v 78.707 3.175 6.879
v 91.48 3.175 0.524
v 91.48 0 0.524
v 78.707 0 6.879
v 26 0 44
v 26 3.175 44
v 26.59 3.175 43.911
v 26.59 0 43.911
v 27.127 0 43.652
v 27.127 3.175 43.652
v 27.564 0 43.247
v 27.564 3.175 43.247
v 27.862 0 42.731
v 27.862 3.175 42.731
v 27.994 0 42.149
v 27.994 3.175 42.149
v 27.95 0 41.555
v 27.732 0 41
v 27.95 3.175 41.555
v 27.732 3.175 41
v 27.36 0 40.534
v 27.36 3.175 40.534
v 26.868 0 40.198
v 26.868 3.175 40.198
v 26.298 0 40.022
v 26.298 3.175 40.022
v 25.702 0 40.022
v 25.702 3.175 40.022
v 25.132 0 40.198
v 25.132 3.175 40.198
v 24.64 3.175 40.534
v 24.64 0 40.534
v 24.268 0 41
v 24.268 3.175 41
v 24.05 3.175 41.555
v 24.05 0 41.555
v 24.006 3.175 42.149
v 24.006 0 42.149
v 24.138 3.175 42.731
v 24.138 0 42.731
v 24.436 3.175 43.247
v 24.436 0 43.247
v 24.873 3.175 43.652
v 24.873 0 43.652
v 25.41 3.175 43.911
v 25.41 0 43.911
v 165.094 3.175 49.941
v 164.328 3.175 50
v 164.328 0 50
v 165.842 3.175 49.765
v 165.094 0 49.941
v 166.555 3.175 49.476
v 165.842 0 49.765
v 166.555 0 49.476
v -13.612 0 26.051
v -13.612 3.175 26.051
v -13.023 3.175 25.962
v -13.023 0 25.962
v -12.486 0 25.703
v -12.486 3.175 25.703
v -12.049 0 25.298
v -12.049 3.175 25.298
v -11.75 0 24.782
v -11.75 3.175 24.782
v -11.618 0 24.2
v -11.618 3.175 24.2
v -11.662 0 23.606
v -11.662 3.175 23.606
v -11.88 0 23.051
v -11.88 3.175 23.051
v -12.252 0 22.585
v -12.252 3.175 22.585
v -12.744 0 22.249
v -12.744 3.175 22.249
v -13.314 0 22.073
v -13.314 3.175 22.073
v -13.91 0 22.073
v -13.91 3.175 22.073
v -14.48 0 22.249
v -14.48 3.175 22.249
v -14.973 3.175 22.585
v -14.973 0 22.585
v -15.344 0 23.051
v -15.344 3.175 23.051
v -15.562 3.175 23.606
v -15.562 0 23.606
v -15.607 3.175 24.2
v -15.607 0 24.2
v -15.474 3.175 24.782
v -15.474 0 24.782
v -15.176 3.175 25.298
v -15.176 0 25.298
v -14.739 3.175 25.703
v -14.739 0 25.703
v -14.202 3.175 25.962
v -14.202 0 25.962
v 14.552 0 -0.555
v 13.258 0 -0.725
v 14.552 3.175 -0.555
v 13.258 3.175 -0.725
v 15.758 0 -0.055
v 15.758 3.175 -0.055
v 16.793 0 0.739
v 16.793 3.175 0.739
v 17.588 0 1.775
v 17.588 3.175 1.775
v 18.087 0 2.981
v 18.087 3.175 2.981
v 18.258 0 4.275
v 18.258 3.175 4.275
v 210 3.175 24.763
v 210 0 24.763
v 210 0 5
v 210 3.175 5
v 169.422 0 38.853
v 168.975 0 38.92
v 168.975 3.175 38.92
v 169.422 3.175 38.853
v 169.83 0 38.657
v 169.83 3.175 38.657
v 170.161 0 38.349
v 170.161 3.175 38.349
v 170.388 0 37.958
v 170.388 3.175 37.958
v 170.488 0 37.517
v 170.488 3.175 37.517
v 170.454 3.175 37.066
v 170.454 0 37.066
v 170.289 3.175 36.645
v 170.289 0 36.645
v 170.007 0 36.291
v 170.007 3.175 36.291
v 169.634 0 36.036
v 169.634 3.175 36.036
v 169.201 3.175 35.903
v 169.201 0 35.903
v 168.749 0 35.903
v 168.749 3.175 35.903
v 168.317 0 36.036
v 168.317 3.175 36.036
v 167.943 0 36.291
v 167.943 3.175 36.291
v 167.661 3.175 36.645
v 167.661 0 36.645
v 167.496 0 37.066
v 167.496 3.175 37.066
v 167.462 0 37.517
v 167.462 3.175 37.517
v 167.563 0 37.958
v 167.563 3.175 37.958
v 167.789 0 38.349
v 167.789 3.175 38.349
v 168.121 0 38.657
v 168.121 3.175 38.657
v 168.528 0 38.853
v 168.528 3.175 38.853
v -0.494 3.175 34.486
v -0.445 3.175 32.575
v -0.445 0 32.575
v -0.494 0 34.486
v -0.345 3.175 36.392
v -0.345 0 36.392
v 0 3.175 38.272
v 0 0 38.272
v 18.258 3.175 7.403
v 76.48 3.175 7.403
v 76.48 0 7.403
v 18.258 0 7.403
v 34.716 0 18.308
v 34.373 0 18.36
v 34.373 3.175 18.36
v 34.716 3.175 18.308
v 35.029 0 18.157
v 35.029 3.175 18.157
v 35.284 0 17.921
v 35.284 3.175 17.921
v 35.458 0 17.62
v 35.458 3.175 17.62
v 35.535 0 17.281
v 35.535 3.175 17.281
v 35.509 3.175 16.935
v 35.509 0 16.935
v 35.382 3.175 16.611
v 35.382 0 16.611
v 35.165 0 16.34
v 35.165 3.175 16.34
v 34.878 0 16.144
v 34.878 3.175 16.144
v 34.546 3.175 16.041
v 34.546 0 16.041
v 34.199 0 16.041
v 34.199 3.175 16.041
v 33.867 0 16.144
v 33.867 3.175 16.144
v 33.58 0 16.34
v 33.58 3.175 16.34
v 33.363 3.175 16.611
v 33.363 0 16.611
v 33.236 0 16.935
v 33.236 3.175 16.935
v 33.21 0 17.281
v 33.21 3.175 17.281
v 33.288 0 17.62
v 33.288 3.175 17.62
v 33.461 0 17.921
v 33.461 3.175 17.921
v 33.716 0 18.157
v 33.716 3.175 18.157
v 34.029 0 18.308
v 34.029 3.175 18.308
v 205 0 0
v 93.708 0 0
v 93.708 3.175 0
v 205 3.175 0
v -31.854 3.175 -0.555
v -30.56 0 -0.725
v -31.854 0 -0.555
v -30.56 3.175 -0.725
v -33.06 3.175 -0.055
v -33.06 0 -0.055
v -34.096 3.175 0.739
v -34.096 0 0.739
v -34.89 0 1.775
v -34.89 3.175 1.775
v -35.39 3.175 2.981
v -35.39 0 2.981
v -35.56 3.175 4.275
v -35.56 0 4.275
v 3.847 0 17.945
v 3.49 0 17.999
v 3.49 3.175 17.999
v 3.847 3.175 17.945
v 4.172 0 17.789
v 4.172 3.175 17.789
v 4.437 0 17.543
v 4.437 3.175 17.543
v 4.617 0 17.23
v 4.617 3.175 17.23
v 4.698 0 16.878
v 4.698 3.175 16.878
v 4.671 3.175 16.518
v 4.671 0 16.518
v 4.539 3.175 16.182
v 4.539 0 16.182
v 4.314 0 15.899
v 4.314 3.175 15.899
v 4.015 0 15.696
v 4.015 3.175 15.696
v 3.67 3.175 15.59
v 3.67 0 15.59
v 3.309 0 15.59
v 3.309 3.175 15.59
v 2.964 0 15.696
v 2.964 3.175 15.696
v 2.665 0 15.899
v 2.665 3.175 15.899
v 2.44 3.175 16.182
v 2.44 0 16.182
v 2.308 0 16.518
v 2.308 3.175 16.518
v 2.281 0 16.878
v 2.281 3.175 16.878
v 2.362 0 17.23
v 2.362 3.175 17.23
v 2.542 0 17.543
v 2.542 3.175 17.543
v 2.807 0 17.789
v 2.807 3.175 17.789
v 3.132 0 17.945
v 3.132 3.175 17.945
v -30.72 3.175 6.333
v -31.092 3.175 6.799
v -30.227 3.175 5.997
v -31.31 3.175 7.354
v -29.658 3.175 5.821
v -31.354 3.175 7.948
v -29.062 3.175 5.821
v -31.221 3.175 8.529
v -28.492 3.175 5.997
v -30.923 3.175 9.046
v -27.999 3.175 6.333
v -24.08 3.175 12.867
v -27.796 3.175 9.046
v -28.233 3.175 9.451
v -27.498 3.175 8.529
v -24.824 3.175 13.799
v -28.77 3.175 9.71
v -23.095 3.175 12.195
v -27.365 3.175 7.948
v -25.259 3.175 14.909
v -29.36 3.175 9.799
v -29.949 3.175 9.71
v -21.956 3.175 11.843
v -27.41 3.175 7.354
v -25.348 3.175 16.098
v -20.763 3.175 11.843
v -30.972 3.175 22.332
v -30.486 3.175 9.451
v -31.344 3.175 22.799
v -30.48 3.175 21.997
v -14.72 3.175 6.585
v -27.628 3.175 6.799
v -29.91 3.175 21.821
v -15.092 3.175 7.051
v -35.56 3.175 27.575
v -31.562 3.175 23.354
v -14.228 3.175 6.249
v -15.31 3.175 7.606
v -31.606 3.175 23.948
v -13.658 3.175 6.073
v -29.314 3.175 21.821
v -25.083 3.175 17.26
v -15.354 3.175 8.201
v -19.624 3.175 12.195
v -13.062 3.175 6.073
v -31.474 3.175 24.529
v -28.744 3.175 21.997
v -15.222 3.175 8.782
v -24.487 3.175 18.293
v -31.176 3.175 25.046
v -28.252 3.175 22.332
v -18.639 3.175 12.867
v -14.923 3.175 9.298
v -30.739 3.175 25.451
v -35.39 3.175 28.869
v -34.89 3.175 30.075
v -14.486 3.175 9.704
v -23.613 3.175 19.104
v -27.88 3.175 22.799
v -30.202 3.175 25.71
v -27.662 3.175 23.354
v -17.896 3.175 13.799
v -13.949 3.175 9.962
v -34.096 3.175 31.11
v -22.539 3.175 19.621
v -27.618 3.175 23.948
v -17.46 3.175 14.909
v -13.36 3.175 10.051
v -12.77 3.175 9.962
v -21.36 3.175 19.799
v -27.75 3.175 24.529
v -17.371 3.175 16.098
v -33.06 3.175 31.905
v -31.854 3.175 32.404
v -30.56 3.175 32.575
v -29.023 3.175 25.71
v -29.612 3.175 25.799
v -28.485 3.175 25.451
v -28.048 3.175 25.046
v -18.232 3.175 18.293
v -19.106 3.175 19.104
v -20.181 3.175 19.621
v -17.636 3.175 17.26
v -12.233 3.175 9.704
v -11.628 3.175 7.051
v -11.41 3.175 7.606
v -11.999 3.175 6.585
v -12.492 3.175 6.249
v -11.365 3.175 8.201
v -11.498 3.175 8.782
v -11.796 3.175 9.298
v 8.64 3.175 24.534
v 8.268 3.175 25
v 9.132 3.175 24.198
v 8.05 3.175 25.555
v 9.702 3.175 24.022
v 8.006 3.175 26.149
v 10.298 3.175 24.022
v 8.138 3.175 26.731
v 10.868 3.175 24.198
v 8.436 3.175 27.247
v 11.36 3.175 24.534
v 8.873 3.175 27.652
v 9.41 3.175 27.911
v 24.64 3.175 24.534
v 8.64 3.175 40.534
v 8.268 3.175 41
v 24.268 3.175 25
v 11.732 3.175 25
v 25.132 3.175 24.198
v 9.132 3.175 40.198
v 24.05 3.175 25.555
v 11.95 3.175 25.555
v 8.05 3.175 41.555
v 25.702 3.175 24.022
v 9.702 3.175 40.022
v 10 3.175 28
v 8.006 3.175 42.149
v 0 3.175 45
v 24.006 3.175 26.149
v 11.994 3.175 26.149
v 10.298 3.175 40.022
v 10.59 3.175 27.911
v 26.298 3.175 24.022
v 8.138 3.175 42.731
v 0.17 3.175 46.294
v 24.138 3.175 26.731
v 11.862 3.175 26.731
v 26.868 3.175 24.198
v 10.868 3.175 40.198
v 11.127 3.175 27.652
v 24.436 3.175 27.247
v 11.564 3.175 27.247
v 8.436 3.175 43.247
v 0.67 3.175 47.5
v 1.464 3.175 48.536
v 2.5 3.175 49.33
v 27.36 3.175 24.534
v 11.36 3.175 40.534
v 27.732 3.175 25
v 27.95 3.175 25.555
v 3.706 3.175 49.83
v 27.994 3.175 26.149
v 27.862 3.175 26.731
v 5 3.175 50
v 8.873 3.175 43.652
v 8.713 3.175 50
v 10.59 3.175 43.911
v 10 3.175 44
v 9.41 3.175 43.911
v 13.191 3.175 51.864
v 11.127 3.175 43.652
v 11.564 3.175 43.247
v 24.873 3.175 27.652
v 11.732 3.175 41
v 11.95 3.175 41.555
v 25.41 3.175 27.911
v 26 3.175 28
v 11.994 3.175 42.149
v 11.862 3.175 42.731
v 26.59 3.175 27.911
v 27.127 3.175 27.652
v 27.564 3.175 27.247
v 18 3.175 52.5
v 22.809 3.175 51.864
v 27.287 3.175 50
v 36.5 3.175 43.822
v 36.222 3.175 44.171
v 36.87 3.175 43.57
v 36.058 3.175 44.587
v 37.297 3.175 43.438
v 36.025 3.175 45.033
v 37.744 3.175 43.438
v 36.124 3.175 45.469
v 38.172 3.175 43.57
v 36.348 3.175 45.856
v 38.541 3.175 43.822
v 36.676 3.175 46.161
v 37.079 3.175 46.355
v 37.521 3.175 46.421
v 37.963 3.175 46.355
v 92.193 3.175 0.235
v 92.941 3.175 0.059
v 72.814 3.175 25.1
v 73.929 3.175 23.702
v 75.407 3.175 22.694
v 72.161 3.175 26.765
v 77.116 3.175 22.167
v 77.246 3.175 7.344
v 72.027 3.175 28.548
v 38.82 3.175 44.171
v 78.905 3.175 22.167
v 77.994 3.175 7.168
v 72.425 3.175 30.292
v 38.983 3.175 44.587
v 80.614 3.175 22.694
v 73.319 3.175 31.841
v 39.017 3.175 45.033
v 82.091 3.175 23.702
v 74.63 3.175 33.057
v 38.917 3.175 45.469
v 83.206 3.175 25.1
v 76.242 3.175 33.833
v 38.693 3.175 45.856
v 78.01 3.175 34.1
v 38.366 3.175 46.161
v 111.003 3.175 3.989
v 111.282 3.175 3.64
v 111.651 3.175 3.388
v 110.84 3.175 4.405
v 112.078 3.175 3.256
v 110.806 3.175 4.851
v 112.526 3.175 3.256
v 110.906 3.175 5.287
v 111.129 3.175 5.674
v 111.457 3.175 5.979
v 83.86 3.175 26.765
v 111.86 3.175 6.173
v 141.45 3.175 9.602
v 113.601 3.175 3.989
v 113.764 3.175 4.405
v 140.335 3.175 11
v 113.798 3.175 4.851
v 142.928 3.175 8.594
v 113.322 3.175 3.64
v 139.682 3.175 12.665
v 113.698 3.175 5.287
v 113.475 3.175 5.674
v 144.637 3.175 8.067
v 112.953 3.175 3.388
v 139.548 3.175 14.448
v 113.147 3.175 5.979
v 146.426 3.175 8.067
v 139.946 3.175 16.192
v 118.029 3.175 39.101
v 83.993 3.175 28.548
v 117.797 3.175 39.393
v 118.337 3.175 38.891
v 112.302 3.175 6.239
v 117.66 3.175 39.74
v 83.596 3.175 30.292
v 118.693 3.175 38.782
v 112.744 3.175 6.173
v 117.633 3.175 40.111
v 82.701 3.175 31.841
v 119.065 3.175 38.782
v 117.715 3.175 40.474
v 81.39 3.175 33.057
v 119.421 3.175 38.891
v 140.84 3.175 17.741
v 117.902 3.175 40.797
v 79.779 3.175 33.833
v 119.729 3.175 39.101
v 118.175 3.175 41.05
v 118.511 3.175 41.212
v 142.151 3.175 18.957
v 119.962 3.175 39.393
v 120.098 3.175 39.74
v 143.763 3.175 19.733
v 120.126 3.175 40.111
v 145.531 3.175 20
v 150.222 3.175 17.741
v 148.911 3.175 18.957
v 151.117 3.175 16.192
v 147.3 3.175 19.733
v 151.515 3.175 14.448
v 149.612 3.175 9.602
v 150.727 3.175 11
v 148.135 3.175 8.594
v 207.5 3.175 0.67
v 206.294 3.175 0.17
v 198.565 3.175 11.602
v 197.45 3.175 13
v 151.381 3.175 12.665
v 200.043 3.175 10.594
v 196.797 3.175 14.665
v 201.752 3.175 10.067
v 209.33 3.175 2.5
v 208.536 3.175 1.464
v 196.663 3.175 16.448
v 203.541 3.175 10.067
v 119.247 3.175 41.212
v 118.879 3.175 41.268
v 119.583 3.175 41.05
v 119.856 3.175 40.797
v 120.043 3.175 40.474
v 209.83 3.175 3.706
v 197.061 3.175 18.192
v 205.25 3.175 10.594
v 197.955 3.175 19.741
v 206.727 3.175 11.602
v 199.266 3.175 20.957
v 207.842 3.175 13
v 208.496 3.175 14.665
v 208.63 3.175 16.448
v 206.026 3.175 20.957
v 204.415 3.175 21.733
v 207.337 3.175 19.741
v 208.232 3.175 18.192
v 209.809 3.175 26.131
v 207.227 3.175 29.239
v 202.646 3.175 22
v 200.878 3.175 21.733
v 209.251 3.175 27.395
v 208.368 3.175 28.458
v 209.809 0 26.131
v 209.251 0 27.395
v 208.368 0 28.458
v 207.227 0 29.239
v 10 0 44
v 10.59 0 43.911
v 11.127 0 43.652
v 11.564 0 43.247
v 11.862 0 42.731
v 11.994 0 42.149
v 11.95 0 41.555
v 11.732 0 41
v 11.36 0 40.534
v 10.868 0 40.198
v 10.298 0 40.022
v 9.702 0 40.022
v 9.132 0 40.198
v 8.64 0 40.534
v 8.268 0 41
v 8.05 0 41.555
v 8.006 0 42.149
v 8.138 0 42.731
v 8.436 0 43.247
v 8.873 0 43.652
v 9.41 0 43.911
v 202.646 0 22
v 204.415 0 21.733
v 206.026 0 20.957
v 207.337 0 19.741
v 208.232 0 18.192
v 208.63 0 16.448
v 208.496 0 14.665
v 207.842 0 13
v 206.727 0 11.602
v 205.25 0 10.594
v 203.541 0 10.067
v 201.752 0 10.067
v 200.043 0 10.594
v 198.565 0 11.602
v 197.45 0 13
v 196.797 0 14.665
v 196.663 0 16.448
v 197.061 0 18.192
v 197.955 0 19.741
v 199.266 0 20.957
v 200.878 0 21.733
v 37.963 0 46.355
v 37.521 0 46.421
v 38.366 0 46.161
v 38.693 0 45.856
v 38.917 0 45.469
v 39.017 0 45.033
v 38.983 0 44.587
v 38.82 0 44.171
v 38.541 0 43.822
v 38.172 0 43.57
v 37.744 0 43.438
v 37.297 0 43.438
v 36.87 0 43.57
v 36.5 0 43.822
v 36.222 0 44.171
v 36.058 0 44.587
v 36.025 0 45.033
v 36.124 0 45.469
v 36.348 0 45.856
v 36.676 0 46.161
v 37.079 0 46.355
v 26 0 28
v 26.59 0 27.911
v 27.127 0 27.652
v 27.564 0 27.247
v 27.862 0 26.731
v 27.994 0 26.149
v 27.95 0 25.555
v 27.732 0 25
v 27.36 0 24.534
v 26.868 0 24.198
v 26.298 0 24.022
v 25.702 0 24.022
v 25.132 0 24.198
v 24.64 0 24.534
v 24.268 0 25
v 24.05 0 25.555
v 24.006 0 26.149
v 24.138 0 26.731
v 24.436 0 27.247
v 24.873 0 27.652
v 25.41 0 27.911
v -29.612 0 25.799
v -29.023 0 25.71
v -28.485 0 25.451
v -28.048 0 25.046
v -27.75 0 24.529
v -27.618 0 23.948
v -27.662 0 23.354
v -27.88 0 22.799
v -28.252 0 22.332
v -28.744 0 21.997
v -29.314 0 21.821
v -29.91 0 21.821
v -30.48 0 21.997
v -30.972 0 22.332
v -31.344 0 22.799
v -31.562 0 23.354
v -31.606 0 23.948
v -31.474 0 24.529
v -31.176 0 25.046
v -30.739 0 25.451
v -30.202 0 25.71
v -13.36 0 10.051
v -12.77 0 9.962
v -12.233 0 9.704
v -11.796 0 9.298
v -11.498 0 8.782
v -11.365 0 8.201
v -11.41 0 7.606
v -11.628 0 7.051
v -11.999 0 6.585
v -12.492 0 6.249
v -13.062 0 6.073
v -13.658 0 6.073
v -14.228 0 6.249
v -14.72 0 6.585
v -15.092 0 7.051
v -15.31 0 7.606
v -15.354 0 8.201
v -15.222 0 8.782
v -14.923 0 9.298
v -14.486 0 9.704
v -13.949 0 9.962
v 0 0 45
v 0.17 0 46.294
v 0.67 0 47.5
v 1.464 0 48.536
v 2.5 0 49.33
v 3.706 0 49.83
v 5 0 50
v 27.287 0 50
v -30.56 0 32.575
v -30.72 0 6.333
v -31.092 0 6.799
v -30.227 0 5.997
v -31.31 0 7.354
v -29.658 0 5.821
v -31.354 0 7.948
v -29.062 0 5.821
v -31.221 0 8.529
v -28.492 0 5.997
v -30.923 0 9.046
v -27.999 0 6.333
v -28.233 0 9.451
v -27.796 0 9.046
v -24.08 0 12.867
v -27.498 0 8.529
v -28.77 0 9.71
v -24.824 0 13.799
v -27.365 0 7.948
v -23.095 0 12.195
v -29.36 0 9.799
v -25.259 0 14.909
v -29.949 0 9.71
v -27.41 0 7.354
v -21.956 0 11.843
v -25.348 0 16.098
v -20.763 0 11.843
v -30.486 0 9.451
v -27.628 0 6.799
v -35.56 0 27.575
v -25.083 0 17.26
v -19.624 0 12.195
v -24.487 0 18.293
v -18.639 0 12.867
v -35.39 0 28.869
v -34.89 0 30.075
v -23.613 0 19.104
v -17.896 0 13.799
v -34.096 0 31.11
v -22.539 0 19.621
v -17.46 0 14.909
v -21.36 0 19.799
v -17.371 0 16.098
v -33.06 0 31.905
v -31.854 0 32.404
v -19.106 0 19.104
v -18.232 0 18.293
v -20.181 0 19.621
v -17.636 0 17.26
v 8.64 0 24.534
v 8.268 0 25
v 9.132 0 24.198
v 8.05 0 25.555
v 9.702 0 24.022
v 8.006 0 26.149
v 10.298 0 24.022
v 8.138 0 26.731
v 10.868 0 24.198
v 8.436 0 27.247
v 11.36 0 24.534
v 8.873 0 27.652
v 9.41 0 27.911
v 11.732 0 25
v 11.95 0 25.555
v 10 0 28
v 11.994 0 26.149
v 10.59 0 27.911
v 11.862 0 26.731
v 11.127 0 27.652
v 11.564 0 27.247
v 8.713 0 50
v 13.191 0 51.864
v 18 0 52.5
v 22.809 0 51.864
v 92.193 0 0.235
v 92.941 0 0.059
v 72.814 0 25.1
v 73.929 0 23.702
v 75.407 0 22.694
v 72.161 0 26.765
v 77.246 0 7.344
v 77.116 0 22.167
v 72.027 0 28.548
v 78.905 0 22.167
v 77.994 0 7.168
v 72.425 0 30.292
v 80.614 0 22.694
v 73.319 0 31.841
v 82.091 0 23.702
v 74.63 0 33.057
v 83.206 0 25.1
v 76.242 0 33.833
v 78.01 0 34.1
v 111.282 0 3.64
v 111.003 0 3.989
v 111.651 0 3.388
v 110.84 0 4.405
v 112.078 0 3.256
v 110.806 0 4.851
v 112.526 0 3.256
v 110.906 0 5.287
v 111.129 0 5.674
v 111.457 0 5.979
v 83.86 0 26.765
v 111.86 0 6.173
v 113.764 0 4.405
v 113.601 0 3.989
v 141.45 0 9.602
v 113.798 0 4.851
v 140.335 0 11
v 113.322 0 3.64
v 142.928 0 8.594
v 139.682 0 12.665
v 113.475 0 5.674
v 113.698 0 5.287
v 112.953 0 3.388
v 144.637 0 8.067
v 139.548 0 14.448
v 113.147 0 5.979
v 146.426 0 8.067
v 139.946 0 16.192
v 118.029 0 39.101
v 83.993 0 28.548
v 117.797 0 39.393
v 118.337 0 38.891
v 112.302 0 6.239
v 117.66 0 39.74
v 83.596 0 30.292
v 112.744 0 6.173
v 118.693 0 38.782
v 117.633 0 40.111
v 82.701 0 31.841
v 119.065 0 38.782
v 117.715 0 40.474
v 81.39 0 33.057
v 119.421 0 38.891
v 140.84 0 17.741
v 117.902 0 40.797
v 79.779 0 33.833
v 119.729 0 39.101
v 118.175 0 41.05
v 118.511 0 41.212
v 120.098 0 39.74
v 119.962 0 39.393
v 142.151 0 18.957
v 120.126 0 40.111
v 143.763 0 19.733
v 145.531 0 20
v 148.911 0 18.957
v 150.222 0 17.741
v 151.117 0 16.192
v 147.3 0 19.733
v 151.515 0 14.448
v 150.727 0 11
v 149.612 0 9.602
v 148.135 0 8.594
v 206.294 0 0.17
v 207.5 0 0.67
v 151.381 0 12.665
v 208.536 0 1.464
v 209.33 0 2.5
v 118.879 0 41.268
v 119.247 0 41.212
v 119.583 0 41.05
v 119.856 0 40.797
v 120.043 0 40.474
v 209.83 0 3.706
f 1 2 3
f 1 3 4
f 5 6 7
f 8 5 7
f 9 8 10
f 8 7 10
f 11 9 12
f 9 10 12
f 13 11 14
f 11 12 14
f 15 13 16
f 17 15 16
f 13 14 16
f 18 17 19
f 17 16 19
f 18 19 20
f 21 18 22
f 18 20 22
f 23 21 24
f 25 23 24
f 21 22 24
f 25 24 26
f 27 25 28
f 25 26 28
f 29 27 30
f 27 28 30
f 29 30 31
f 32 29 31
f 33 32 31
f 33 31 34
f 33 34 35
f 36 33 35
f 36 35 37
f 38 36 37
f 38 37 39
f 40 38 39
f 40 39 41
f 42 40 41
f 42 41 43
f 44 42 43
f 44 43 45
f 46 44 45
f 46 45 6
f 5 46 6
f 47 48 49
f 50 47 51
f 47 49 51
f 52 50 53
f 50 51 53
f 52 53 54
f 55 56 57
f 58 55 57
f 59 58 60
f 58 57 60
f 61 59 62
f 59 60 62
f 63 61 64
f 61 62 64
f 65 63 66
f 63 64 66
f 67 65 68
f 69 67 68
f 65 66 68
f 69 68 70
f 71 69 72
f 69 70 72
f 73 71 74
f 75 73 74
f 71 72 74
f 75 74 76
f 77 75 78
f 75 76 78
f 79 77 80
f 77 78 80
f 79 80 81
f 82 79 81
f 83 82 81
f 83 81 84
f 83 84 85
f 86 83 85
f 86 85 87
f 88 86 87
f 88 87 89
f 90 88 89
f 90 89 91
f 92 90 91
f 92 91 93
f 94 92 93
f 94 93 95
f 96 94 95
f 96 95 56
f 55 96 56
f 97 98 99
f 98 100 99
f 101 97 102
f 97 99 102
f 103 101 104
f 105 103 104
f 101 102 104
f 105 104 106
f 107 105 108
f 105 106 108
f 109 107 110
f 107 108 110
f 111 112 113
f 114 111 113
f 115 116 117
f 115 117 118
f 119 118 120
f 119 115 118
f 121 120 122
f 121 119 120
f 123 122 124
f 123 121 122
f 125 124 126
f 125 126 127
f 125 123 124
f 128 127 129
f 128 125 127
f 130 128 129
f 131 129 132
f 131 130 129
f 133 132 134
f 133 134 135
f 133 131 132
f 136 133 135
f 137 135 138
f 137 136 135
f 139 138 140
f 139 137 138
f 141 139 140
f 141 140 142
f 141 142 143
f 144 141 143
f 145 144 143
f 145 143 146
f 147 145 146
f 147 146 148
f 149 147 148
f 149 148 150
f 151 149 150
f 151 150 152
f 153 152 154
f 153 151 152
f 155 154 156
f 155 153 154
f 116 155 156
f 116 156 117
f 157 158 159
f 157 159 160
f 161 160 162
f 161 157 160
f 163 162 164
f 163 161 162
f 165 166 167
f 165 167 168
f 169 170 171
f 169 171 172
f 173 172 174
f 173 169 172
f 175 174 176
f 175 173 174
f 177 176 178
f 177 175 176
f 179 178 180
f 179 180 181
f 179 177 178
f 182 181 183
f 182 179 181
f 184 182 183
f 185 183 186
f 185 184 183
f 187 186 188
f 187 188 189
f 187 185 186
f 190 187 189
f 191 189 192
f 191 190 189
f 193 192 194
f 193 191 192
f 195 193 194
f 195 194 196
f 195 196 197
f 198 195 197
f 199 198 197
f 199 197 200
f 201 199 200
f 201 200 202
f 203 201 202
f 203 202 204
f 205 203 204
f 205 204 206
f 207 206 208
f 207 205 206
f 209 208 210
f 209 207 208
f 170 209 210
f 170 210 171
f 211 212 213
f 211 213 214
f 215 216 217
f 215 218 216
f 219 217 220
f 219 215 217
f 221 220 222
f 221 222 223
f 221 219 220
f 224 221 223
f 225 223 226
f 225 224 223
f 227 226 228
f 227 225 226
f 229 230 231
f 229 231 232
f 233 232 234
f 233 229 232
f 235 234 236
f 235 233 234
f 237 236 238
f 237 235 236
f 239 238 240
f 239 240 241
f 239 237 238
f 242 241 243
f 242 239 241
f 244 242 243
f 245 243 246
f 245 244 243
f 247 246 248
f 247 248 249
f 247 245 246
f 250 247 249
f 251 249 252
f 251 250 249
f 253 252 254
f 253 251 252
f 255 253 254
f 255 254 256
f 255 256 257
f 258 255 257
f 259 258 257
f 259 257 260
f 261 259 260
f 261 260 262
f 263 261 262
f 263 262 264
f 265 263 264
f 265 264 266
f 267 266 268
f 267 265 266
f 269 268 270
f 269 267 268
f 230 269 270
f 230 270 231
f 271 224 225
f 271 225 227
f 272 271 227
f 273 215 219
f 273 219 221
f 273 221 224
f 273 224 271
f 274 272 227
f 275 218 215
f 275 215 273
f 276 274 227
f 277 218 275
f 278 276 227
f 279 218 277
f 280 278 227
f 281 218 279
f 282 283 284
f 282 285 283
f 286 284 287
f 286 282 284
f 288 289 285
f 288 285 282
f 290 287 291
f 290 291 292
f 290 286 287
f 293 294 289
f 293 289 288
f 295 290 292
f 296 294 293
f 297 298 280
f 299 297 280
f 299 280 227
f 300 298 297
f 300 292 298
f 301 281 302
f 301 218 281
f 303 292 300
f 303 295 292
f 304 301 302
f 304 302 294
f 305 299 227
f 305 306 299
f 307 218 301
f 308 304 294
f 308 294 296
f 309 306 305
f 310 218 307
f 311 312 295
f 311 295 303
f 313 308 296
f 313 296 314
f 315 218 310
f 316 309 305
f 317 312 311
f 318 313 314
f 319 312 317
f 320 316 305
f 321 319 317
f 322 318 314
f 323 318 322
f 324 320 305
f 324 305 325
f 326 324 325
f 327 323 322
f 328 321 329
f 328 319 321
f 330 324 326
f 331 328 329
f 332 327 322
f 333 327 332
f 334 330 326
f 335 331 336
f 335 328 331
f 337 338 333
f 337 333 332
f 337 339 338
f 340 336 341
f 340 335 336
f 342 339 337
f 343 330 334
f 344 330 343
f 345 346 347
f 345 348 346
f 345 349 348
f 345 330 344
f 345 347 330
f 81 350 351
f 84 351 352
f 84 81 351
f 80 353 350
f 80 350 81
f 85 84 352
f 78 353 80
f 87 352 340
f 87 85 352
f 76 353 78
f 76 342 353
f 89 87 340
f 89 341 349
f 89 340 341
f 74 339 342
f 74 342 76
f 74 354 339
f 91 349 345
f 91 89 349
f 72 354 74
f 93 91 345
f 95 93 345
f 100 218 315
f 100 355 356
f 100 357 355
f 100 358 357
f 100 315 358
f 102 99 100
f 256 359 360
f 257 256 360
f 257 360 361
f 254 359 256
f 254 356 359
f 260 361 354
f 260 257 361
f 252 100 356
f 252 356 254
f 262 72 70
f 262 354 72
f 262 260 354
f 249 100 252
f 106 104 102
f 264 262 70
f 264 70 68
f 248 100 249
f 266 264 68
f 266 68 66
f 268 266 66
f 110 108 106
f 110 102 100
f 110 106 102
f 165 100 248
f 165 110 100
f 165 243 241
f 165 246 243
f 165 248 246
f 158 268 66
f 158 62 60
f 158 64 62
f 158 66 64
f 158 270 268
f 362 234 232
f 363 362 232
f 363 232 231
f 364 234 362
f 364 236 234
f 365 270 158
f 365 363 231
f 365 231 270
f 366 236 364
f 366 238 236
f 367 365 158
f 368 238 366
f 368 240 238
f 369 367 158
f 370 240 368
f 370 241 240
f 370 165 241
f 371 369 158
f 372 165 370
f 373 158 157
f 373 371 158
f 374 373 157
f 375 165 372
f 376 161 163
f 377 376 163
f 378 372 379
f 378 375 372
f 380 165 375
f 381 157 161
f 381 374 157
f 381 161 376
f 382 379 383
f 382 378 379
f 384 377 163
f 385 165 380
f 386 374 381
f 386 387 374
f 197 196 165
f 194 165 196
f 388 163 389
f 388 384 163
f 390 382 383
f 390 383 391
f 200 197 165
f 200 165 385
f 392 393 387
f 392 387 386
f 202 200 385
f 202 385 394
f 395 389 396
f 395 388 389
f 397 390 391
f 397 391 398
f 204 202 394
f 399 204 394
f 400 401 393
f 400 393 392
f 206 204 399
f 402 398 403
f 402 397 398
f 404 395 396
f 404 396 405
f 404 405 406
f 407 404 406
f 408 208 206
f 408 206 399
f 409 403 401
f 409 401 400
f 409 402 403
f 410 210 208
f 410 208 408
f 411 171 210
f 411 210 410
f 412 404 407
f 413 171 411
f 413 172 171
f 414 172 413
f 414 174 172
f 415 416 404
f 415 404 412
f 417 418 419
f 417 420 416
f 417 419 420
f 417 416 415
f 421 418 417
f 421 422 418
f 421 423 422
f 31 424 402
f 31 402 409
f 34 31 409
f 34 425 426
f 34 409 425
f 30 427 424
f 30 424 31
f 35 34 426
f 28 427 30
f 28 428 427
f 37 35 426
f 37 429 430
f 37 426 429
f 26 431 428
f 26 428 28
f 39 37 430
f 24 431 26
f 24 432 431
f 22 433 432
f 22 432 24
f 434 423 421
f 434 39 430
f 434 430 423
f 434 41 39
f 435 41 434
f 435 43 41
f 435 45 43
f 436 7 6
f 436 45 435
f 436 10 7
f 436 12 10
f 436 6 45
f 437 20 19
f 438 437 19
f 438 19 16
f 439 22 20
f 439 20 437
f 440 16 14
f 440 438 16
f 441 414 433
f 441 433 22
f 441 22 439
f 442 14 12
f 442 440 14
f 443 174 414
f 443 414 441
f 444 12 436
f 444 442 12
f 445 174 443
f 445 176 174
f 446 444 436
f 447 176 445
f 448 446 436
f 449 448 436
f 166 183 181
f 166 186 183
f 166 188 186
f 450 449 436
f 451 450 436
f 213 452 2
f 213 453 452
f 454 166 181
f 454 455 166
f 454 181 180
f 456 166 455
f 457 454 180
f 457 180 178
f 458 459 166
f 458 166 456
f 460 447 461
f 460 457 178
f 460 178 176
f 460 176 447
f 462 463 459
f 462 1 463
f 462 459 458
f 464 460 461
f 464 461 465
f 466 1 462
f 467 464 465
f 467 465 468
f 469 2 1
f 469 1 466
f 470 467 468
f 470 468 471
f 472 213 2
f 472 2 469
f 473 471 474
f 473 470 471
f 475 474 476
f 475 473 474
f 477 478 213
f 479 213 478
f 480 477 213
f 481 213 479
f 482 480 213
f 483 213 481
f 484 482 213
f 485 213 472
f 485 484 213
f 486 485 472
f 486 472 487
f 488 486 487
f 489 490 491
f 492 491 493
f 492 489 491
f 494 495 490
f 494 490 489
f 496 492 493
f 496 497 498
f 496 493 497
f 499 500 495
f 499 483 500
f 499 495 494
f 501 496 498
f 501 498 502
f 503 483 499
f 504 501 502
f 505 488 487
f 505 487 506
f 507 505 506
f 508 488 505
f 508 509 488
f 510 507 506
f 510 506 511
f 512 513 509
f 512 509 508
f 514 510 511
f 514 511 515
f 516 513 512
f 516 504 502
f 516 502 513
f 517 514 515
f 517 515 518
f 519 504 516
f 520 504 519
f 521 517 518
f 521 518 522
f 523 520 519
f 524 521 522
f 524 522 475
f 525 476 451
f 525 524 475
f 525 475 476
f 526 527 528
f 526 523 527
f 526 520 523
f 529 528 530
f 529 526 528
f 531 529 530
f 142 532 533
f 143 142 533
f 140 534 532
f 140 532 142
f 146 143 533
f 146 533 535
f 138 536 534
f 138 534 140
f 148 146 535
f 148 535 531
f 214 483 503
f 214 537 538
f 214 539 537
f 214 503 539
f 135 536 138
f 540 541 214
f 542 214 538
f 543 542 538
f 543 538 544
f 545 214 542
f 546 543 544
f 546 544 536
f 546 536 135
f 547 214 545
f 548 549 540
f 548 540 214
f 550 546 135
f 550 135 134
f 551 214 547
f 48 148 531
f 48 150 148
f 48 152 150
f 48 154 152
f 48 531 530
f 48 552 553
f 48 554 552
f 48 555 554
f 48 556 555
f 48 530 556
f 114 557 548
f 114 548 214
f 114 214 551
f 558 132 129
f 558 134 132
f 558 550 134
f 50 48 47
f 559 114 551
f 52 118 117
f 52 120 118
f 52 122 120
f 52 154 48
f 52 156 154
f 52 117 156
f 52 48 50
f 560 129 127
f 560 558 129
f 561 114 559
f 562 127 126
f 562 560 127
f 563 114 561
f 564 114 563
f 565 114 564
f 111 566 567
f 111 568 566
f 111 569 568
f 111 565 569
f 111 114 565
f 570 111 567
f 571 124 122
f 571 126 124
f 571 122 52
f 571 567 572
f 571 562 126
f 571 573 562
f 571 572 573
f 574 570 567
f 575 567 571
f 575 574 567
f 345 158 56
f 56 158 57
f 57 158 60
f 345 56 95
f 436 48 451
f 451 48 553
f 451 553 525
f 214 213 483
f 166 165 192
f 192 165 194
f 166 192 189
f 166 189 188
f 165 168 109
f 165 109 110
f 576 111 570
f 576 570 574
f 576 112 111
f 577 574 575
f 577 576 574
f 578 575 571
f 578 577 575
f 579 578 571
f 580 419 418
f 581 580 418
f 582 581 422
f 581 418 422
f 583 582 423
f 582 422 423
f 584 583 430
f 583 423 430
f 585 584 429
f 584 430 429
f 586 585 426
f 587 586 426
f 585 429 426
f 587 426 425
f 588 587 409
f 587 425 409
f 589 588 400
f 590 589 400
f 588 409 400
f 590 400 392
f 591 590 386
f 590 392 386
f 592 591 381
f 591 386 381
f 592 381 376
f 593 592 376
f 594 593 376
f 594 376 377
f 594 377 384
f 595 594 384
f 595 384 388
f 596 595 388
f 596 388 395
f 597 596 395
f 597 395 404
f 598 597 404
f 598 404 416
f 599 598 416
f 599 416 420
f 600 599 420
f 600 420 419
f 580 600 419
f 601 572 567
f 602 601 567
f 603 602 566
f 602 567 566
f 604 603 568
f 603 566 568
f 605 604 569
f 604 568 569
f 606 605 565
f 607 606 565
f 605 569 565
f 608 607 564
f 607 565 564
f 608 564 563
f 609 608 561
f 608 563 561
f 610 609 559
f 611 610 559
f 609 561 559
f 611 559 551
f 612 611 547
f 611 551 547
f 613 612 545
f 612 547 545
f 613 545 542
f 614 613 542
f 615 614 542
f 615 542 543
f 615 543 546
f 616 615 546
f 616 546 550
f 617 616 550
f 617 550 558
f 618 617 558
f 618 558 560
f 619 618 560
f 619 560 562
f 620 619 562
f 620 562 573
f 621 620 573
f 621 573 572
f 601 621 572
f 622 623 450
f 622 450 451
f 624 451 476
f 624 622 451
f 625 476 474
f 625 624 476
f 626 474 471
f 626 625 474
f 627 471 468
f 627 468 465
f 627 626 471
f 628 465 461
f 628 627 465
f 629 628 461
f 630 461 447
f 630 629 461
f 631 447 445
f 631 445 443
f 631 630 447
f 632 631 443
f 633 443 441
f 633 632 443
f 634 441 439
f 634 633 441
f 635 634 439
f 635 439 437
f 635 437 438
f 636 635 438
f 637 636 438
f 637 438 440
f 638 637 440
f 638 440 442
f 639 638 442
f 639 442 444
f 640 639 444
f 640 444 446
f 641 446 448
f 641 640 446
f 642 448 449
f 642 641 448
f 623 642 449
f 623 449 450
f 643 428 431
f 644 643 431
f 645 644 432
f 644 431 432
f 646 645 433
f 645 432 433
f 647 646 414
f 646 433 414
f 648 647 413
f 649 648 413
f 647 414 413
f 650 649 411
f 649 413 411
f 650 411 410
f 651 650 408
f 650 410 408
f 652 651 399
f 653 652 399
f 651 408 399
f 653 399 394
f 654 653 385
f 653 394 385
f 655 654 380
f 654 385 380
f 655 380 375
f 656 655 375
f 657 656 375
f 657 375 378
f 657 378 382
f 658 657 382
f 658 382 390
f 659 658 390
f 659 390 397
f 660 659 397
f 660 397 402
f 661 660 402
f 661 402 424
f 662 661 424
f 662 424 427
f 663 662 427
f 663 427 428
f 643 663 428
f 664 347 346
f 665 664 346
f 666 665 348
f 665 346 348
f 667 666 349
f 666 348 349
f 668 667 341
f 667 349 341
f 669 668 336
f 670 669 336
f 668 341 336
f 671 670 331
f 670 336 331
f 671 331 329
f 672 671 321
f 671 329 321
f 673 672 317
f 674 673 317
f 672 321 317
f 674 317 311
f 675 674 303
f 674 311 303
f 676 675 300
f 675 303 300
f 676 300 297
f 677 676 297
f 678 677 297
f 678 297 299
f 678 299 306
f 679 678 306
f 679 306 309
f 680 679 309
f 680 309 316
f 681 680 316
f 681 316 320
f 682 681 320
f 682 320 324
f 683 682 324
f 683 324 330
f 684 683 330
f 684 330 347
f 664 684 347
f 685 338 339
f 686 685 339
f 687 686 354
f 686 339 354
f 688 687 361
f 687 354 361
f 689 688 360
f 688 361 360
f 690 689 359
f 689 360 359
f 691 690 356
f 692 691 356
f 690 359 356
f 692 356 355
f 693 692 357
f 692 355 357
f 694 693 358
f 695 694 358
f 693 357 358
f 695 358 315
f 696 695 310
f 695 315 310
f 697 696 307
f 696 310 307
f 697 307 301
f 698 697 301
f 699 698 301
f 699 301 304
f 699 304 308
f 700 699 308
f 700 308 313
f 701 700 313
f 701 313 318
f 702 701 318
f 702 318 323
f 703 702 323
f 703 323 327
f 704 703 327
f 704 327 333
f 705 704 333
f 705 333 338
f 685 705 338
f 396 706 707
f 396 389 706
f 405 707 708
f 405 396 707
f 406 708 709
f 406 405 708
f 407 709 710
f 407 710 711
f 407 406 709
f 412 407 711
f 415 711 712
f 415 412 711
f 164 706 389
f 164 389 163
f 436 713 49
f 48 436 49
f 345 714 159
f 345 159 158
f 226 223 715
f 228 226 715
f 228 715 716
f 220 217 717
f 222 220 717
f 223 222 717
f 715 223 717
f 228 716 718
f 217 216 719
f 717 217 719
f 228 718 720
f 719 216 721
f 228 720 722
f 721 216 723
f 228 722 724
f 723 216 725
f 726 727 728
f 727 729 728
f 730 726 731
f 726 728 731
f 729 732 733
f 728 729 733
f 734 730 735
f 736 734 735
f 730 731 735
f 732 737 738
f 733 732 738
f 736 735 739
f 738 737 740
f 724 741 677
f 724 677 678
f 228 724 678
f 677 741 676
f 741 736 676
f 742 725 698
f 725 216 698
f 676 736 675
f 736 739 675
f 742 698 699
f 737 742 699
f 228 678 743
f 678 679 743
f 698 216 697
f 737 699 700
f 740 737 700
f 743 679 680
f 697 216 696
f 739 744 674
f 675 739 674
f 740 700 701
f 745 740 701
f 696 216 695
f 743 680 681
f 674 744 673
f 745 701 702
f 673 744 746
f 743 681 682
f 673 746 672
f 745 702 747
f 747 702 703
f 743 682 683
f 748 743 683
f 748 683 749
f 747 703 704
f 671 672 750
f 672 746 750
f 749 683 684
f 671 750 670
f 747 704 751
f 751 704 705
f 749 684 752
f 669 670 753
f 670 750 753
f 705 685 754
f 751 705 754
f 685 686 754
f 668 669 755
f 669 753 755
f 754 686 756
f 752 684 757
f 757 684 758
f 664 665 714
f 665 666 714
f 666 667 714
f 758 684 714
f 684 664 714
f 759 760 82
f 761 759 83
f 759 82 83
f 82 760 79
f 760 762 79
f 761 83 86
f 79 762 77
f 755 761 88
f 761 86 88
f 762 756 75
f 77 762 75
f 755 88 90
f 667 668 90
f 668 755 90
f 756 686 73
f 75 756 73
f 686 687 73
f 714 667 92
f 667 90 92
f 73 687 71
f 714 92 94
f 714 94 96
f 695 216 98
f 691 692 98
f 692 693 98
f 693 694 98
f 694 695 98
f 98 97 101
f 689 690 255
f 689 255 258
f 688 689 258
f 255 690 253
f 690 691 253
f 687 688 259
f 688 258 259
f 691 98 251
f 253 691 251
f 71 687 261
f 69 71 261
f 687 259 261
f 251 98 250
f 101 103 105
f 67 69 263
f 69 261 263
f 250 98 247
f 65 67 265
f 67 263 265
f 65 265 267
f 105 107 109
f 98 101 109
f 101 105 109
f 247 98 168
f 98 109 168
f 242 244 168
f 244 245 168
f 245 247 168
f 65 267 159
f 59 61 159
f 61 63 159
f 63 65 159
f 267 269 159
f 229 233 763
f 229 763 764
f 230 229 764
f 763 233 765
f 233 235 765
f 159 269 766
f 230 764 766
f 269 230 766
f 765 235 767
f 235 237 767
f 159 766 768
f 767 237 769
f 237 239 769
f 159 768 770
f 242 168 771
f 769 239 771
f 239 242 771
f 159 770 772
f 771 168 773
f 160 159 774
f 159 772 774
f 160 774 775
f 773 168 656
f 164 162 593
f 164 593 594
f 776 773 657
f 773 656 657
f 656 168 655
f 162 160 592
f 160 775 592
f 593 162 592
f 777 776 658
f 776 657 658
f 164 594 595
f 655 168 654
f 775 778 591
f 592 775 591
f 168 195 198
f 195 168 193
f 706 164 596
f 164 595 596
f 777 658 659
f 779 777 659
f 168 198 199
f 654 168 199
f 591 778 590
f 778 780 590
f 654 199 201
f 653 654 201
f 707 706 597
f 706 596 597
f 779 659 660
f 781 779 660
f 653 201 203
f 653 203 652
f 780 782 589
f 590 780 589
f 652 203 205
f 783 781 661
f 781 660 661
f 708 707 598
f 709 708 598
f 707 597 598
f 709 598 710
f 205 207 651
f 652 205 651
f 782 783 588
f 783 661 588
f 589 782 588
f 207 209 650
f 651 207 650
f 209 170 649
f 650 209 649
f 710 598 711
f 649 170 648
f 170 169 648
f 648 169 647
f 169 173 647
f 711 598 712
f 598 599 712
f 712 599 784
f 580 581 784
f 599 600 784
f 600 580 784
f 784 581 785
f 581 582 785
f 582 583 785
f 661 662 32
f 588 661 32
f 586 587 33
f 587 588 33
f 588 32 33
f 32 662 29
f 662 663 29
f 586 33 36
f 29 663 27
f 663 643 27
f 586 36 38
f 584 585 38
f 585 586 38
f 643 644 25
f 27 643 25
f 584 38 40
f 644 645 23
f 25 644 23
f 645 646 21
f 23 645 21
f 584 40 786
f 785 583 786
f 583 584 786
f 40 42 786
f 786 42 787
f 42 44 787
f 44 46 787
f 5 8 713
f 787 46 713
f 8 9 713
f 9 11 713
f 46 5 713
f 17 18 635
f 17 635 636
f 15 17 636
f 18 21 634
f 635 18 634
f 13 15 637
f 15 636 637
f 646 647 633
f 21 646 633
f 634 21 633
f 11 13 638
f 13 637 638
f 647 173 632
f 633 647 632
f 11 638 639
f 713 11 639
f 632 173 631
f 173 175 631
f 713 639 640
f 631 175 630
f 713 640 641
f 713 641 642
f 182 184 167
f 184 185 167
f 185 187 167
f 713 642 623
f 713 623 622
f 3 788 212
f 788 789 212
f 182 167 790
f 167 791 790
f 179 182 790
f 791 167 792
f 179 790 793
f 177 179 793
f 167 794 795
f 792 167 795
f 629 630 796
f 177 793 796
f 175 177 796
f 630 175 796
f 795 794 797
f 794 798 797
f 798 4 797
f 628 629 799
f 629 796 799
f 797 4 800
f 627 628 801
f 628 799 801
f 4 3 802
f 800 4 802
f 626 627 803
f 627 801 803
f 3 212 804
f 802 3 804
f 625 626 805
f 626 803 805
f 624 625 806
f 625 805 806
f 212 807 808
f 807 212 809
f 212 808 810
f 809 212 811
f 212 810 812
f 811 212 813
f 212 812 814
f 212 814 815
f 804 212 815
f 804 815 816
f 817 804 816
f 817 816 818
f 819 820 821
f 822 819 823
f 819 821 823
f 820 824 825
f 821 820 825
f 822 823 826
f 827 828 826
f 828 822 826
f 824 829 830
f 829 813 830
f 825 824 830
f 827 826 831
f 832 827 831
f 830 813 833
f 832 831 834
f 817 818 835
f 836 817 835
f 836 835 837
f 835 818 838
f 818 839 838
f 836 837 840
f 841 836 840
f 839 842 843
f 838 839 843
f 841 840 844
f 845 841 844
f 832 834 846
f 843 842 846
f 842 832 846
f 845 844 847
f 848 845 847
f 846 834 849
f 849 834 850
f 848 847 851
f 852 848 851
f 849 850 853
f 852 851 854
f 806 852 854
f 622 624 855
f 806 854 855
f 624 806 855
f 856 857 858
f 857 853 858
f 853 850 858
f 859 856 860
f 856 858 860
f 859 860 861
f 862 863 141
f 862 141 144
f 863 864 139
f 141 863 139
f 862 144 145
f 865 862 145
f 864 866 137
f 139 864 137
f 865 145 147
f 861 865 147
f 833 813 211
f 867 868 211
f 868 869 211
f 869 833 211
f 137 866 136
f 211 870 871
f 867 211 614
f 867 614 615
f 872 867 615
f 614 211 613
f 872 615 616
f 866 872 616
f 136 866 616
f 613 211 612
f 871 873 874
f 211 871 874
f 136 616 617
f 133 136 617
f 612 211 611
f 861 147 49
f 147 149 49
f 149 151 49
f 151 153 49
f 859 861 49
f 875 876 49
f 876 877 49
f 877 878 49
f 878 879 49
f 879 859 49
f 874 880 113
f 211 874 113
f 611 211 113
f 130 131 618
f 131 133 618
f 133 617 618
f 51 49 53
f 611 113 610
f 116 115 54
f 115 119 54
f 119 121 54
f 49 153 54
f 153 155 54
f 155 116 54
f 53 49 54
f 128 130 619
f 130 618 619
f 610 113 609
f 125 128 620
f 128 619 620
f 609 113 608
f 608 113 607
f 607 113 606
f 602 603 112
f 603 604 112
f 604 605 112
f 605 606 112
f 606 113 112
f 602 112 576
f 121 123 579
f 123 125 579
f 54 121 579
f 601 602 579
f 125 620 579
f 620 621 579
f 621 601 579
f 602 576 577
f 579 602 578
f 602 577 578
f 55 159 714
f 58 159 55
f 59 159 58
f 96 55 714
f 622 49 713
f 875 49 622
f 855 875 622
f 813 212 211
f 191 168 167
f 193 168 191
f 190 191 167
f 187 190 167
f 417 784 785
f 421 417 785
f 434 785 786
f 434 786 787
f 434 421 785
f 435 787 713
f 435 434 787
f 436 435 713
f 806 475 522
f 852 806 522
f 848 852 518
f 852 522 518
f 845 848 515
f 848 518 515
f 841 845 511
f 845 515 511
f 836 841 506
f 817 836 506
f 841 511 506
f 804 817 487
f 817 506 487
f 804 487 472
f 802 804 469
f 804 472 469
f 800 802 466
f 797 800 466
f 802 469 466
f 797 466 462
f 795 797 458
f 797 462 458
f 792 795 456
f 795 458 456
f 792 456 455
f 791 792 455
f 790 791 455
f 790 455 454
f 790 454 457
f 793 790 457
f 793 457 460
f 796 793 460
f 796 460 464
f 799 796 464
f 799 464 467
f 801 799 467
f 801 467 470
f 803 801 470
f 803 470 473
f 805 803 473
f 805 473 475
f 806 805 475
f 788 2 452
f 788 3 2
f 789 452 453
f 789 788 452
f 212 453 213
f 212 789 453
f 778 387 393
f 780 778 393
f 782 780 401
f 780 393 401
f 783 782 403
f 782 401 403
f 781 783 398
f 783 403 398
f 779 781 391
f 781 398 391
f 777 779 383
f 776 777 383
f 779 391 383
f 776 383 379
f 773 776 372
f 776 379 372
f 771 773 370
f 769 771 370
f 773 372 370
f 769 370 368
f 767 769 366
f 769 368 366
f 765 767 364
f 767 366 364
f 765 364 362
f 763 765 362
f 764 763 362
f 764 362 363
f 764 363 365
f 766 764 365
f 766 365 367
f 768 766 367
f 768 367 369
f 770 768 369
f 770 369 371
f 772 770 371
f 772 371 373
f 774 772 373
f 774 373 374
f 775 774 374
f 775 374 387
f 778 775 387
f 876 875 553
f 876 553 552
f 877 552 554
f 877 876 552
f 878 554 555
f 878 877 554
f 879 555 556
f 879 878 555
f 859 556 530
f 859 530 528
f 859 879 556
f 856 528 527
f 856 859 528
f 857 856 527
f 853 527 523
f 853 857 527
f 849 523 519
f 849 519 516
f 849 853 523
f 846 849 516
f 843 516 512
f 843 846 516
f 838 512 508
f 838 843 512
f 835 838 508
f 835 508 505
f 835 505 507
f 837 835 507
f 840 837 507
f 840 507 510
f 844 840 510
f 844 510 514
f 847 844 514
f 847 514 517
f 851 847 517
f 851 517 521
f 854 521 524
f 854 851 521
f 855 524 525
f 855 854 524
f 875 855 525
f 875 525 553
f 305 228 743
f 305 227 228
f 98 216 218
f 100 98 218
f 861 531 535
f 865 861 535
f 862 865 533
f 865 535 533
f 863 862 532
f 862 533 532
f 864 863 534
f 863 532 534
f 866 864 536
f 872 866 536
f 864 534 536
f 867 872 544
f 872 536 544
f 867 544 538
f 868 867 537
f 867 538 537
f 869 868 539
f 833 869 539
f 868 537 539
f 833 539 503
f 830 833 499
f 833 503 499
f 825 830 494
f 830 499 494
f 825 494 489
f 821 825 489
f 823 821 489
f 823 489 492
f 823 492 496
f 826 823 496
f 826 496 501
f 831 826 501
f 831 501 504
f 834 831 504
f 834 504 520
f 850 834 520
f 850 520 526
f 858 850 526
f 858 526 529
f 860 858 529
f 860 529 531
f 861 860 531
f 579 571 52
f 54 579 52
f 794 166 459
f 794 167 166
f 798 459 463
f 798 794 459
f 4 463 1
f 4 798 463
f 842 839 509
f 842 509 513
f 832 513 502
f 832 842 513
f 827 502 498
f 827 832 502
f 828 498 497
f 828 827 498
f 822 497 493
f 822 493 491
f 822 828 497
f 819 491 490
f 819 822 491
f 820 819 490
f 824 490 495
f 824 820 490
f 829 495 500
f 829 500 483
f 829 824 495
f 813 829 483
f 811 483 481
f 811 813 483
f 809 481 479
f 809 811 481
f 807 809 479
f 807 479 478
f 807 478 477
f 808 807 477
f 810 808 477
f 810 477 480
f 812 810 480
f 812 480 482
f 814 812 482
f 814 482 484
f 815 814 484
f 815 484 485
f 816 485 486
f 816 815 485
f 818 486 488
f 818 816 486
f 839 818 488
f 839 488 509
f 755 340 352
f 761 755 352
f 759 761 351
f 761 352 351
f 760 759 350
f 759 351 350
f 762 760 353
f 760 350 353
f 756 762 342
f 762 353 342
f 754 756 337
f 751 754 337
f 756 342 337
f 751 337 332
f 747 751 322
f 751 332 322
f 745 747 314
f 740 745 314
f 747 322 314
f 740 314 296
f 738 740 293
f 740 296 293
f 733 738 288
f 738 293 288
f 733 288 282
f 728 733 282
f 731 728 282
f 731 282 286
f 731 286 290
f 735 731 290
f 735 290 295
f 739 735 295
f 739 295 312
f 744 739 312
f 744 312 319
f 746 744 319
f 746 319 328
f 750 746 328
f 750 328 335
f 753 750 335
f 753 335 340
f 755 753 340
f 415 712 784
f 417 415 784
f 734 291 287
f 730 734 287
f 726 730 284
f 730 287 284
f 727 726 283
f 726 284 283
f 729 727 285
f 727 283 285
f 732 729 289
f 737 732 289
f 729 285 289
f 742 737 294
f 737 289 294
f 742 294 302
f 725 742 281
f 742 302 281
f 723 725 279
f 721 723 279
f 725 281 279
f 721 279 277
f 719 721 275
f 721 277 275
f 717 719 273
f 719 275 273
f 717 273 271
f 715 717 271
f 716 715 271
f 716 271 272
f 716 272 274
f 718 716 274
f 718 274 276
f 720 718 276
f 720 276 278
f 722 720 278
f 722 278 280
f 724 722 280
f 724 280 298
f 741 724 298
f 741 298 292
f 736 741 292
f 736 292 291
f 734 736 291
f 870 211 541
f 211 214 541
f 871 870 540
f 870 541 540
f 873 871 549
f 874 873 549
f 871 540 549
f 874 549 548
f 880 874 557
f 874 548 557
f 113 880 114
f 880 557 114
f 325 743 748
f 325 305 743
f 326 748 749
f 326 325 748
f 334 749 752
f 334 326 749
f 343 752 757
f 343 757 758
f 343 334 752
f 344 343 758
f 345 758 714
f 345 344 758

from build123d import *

# Parameters (mm, degrees)
SKETCH1_W           = 210
SKETCH1_H           = 50
SKETCH1_R           = 1.211665018
SKETCH1_R_2         = 1.165617118
SKETCH1_R_3         = 1.5
SKETCH1_R_4         = 1.25
SKETCH1_R_5         = 1.517273905
BOSS_EXTRUDE1_DEPTH = 3.175
SKETCH2_R           = 2
CUT_EXTRUDE1_DEPTH  = 10
SKETCH3_R           = 6
SKETCH3_R_2         = 0.586995366
CUT_EXTRUDE2_DEPTH  = 57.15
CUT_EXTRUDE7_DEPTH  = 10
FILLET3_R           = 5
SKETCH11_R          = 18.5
SKETCH11_R_2        = 2
BOSS_EXTRUDE4_DEPTH = 3.175
SKETCH16_W          = 18.257640281
SKETCH16_H          = 3.175
BOSS_EXTRUDE7_DEPTH = 8.128
SKETCH17_W          = 33.3
SKETCH17_H          = 3.175
BOSS_EXTRUDE8_DEPTH = 35.56
SKETCH18_R          = 2
CUT_EXTRUDE8_DEPTH  = 9
SKETCH19_R          = 4
CUT_EXTRUDE9_DEPTH  = 40
FILLET4_R           = 5


with BuildPart() as part:
    # Sketch1 → Boss-Extrude1 (new body)
    with BuildSketch(Plane(origin=(0, 0, 0), x_dir=(1, 0, 0), z_dir=(0, 1, 0))):
        with Locations((105, -25)):
            Rectangle(SKETCH1_W, SKETCH1_H)
        with Locations(Location((3.489526233, -16.787661112, 0), (0, 0, 270))):
            Circle(SKETCH1_R, mode=Mode.SUBTRACT)
        with Locations(Location((34.37258772, -17.194005245, 0), (0, 0, 270))):
            Circle(SKETCH1_R_2, mode=Mode.SUBTRACT)
        with Locations(Location((37.520749958, -44.921198121, 0), (0, 0, 270))):
            Circle(SKETCH1_R_3, mode=Mode.SUBTRACT)
        with Locations(Location((118.879039361, -40.017685043, 0), (0, 0, 270))):
            Circle(SKETCH1_R_4, mode=Mode.SUBTRACT)
        with Locations(Location((112.302052499, -4.739260115, 0), (0, 0, 270))):
            Circle(SKETCH1_R_3, mode=Mode.SUBTRACT)
        with Locations(Location((168.975233936, -37.403209633, 0), (0, 0, 270))):
            Circle(SKETCH1_R_5, mode=Mode.SUBTRACT)
    extrude(amount=BOSS_EXTRUDE1_DEPTH)

    # Sketch2 → Cut-Extrude1 (cut)
    with BuildSketch(Plane(origin=(0, 3.175, 0), x_dir=(1, 0, 0), z_dir=(0, 1, 0))):
        with Locations(Location((10, -26, 0), (0, 0, 270))):
            Circle(SKETCH2_R)
        with Locations(Location((10, -42, 0), (0, 0, 270))):
            Circle(SKETCH2_R)
        with Locations(Location((26, -26, 0), (0, 0, 270))):
            Circle(SKETCH2_R)
        with Locations(Location((26, -42, 0), (0, 0, 270))):
            Circle(SKETCH2_R)
    extrude(amount=-CUT_EXTRUDE1_DEPTH, mode=Mode.SUBTRACT)

    # Sketch3 → Cut-Extrude2 (cut)
    with BuildSketch(Plane(origin=(0, 3.175, 0), x_dir=(1, 0, 0), z_dir=(0, 1, 0))):
        with Locations(Location((78.01026379, -28.1, 0), (0, 0, 270))):
            Circle(SKETCH3_R)
        with Locations(Location((145.531297368, -14, 0), (0, 0, 270))):
            Circle(SKETCH3_R)
        with Locations(Location((18, -34, 0), (0, 0, 270))):
            Circle(SKETCH3_R_2)
        with Locations(Location((202.646291021, -16, 0), (0, 0, 270))):
            Circle(SKETCH3_R)
    extrude(amount=-CUT_EXTRUDE2_DEPTH, mode=Mode.SUBTRACT)

    # Sketch10 → Cut-Extrude7 (cut)
    with BuildSketch(Plane(origin=(0, 3.175, 0), x_dir=(1, 0, 0), z_dir=(0, 1, 0))):
        Polygon((210, -27.859435908), (165.502877994, -50), (210, -50), align=None)
        Polygon((92.532613397, 0), (77.65477062, -7.402812063), (0, -7.402812063), (0, 0), align=None)
    extrude(amount=-CUT_EXTRUDE7_DEPTH, mode=Mode.SUBTRACT)

    # Fillet3
    fillet3_edges = [part.edges().sort_by_distance(p)[0] for p in [
        (210, 1.5875, 0),
        (92.532613397, 1.5875, 0),
        (210, 1.5875, 27.859435908),
        (165.502877994, 1.5875, 50),
        (77.65477062, 1.5875, 7.402812063),
    ]]
    fillet(fillet3_edges, radius=FILLET3_R)

    # Sketch11 → Boss-Extrude4 (add)
    with BuildSketch(Plane(origin=(0, 3.175, 0), x_dir=(1, 0, 0), z_dir=(0, 1, 0))):
        with Locations((18, -34)):
            Circle(SKETCH11_R)
        with Locations(Location((10, -26, 0), (0, 0, 270))):
            Circle(SKETCH11_R_2, mode=Mode.SUBTRACT)
        with Locations(Location((10, -42, 0), (0, 0, 270))):
            Circle(SKETCH11_R_2, mode=Mode.SUBTRACT)
        with Locations(Location((26, -26, 0), (0, 0, 270))):
            Circle(SKETCH11_R_2, mode=Mode.SUBTRACT)
        with Locations(Location((26, -42, 0), (0, 0, 270))):
            Circle(SKETCH11_R_2, mode=Mode.SUBTRACT)
    extrude(amount=-BOSS_EXTRUDE4_DEPTH)

    # Sketch16 → Boss-Extrude7 (add)
    with BuildSketch(Plane(origin=(0, 0, 7.402812063), x_dir=(-1, 0, 0), z_dir=(0, 0, -1))):
        with Locations((-9.128820141, 1.5875)):
            Rectangle(SKETCH16_W, SKETCH16_H)
    extrude(amount=BOSS_EXTRUDE7_DEPTH)

    # Sketch17 → Boss-Extrude8 (add)
    with BuildSketch(Plane.ZY):
        with Locations((15.924812063, 1.5875)):
            Rectangle(SKETCH17_W, SKETCH17_H)
    extrude(amount=BOSS_EXTRUDE8_DEPTH)

    # Sketch18 → Cut-Extrude8 (cut)
    with BuildSketch(Plane(origin=(0, 3.175, 0), x_dir=(1, 0, 0), z_dir=(0, 1, 0))):
        with Locations(Location((-29.612034681, -23.798543698, 0), (0, 0, 270))):
            Circle(SKETCH18_R)
        with Locations(Location((-29.359661767, -7.798707515, 0), (0, 0, 270))):
            Circle(SKETCH18_R)
        with Locations(Location((-13.359825583, -8.051080428, 0), (0, 0, 270))):
            Circle(SKETCH18_R)
        with Locations(Location((-13.612198497, -24.050916612, 0), (0, 0, 270))):
            Circle(SKETCH18_R)
    extrude(amount=-CUT_EXTRUDE8_DEPTH, mode=Mode.SUBTRACT)

    # Sketch19 → Cut-Extrude9 (cut)
    with BuildSketch(Plane(origin=(0, 3.175, 0), x_dir=(1, 0, 0), z_dir=(0, 1, 0))):
        with Locations(Location((-21.359661767, -15.798707515, 0), (0, 0, 270))):
            Circle(SKETCH19_R)
    extrude(amount=-CUT_EXTRUDE9_DEPTH, mode=Mode.SUBTRACT)

    # Fillet4
    fillet4_edges = [part.edges().sort_by_distance(p)[0] for p in [
        (18.257640281, 1.5875, -0.725187937),
        (-35.56, 1.5875, -0.725187937),
        (-35.56, 1.5875, 32.574812063),
        (0, 1.5875, 50),
    ]]
    fillet(fillet4_edges, radius=FILLET4_R)


solid = part.part
